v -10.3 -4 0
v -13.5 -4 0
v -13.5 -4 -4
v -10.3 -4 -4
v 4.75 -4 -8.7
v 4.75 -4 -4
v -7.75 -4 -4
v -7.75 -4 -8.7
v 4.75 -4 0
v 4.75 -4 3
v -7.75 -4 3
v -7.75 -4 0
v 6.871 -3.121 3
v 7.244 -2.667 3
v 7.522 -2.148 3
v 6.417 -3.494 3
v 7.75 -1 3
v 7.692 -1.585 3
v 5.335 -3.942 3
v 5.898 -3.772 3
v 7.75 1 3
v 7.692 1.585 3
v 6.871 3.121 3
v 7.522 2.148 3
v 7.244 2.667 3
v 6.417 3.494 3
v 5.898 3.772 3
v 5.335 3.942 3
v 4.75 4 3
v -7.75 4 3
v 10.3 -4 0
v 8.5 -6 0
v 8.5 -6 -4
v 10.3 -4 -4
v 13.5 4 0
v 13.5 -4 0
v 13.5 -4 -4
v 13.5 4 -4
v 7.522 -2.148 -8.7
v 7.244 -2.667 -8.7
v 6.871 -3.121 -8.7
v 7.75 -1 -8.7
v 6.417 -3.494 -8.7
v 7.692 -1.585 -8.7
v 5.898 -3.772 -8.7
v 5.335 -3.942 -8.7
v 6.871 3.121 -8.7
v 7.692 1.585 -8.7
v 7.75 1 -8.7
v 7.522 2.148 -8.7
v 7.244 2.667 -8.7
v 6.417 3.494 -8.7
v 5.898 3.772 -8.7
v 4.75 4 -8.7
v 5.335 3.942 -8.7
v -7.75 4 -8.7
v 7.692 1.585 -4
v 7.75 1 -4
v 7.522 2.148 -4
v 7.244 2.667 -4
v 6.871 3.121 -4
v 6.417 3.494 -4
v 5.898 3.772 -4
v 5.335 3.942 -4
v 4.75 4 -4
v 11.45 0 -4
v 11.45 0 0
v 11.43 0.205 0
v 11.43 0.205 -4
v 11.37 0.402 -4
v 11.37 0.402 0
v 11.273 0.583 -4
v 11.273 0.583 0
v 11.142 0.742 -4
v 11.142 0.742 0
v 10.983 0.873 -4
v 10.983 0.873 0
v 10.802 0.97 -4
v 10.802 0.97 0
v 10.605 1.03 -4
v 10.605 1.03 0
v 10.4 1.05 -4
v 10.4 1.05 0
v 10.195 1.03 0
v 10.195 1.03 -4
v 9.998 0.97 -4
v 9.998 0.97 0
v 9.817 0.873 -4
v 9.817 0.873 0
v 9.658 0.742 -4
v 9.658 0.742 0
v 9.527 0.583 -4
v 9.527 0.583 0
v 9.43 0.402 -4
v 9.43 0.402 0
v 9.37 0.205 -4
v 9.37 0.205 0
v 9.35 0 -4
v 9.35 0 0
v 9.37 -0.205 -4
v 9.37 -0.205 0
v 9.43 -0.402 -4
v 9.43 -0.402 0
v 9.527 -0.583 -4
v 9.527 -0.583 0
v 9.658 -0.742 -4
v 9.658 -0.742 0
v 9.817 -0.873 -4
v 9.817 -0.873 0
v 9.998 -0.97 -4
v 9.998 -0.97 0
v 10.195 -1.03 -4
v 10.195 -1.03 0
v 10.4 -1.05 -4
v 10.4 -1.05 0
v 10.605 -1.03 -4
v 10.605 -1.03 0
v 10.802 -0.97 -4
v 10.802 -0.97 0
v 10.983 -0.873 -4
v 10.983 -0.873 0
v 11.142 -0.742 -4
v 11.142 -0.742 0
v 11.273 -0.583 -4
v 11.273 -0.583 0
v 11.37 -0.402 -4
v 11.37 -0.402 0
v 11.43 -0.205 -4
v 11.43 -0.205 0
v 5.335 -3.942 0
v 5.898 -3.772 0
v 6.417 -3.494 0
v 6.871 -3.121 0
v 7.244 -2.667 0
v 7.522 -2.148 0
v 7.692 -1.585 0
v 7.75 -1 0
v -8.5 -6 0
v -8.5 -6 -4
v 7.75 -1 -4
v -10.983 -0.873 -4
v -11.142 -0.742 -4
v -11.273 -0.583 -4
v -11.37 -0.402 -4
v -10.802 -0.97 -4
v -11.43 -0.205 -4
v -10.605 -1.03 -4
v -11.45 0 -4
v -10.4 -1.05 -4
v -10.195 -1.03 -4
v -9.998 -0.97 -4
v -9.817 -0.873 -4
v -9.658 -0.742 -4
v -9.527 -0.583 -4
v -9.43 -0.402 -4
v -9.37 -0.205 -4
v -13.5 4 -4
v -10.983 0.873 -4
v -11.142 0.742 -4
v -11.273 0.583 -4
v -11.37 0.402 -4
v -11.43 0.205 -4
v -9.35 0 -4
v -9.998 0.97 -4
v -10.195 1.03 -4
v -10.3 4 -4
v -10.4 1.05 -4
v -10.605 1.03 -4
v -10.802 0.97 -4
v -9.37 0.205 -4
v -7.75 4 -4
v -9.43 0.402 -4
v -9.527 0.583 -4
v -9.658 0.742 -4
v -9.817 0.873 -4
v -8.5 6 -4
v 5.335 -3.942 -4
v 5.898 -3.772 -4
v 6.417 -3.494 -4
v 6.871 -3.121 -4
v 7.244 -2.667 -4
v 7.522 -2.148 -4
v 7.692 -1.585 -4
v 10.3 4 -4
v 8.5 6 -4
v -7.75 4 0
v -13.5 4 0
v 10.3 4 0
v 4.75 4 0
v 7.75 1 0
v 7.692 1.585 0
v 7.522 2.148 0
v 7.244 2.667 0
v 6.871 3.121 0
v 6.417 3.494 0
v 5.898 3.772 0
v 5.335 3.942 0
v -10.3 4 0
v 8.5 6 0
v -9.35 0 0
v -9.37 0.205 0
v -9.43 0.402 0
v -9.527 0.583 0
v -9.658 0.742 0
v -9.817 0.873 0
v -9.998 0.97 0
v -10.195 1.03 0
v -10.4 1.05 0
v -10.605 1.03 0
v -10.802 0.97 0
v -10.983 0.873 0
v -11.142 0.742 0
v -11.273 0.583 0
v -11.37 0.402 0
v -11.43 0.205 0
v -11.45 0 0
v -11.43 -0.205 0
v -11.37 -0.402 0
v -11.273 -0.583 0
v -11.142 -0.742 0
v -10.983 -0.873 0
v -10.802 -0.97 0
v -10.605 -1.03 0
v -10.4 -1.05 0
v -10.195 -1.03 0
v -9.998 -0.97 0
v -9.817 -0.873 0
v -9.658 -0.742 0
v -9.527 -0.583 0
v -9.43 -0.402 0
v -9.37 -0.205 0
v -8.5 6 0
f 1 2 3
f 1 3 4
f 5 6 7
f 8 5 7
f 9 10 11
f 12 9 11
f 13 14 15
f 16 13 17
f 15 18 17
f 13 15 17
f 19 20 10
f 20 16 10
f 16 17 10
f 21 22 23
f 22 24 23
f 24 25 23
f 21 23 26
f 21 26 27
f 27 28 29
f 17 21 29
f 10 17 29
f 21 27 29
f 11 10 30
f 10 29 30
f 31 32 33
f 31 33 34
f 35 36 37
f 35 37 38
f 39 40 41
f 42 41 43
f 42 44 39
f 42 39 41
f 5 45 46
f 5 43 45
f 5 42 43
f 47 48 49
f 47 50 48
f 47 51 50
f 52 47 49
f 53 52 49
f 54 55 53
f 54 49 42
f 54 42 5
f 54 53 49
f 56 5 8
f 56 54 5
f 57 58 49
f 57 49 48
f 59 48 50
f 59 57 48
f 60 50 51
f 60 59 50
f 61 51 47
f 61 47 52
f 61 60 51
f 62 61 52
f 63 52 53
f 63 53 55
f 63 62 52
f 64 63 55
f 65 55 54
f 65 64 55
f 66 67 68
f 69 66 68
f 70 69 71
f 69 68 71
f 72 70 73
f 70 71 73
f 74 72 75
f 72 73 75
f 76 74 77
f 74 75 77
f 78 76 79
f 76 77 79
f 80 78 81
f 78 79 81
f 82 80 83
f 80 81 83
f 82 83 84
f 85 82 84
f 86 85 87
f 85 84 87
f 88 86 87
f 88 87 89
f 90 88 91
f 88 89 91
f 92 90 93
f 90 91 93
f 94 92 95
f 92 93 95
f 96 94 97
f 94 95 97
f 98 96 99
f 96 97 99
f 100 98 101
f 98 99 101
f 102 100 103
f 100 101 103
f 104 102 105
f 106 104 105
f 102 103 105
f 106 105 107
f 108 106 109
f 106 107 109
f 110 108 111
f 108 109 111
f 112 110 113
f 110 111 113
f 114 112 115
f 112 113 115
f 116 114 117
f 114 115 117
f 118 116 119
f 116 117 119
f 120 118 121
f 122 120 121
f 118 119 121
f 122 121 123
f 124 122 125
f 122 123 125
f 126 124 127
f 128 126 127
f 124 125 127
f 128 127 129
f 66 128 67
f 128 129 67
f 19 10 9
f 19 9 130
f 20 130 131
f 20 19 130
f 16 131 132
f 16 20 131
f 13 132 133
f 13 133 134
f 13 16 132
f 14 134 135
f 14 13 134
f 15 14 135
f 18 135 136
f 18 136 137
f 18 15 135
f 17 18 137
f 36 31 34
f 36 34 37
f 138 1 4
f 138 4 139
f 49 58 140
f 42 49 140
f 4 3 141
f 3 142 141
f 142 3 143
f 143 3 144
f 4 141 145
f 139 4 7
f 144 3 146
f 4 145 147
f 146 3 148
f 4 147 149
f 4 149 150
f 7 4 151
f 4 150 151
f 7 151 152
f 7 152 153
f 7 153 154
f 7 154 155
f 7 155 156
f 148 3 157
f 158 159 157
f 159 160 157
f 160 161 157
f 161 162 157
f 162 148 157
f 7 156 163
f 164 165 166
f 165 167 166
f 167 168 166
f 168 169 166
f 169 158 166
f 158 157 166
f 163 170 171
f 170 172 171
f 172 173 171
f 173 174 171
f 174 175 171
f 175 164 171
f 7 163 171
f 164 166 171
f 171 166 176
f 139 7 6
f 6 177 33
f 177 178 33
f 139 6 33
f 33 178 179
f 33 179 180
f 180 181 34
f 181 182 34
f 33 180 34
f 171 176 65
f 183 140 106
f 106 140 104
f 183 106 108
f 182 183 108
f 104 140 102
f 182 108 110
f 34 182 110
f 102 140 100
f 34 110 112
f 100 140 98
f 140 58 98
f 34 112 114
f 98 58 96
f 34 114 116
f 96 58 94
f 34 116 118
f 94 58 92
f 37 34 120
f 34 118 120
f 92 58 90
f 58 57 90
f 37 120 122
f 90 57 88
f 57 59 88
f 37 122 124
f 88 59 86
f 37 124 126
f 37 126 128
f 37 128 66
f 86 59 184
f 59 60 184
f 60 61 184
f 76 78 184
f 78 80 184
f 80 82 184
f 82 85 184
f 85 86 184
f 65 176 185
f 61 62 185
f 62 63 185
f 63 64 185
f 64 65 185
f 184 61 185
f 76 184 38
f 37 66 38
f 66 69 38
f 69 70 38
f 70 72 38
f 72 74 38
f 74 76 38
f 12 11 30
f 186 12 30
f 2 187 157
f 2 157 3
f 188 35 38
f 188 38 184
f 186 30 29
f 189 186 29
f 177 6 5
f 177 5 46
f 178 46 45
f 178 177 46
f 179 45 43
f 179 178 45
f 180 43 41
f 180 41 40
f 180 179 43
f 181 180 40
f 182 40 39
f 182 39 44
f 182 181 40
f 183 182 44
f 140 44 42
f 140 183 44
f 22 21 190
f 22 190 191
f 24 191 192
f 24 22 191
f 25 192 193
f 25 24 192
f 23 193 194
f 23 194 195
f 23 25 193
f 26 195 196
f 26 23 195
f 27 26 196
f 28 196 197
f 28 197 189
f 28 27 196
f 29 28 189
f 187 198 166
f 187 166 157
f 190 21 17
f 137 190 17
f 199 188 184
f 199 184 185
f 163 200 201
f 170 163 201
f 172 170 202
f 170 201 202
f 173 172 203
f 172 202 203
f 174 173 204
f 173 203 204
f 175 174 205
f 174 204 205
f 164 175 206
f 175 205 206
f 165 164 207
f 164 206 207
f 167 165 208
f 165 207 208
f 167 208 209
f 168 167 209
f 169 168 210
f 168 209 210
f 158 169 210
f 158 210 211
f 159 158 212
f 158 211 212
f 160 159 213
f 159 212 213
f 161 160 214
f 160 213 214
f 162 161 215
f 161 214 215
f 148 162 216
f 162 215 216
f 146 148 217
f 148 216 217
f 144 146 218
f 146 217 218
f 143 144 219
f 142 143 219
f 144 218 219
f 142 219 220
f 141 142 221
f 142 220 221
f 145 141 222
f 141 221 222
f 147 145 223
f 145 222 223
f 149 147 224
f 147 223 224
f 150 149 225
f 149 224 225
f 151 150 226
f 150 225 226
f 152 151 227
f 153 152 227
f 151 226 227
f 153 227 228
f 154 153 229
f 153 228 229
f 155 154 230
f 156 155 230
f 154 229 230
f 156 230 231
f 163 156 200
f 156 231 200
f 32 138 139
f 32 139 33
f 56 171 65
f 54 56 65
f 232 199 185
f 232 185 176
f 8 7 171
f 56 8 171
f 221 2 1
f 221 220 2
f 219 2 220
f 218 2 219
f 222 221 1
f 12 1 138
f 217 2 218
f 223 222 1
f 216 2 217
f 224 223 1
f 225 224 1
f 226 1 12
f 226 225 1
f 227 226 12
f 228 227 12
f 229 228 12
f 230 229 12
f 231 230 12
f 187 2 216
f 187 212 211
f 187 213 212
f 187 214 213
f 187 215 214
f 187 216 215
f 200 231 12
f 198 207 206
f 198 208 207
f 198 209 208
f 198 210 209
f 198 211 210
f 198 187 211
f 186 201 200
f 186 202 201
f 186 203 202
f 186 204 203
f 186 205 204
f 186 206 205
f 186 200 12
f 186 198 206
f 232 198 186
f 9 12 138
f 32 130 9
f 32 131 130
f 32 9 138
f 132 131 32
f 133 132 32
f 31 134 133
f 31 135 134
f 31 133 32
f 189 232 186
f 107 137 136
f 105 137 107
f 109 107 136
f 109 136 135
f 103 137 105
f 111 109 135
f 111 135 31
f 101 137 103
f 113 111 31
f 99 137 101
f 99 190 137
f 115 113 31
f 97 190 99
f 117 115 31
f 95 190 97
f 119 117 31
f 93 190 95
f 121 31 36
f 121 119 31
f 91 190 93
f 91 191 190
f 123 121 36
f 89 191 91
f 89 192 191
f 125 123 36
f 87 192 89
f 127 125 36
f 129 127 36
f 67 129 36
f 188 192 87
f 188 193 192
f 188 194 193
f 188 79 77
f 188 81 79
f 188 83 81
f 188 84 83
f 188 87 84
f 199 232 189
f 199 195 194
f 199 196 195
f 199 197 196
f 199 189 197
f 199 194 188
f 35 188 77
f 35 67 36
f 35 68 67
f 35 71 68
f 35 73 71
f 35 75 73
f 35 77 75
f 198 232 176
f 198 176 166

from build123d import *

# Parameters (mm, degrees)
PAD_DEPTH      = 3
PAD_DEPTH_BACK = 8.7
SKETCH001_R    = 1.05
PAD001_DEPTH   = 4


with BuildPart() as part:
    # Sketch → Pad (new body, two sides)
    with BuildSketch(Plane.XY) as pad_sk:
        with BuildLine():
            Line((-7.75, -4), (-7.75, 4))
            Line((-7.75, 4), (4.75, 4))
            ThreePointArc((7.75, 1), (6.87132, 3.12132), (4.75, 4))
            Line((7.75, 1), (7.75, -1))
            ThreePointArc((4.75, -4), (6.87132, -3.12132), (7.75, -1))
            Line((4.75, -4), (-7.75, -4))
        make_face()
    extrude(amount=PAD_DEPTH)
    extrude(pad_sk.sketch, amount=-PAD_DEPTH_BACK)

    # Sketch001 → Pad001 (join)
    with BuildSketch(Plane.XY):
        Polygon((-13.5, 4), (-13.5, -4), (-10.3, -4), (-8.5, -6), (8.5, -6), (10.3, -4), (13.5, -4), (13.5, 4), (10.3, 4), (8.5, 6), (-8.5, 6), (-10.3, 4), align=None)
        with Locations((-10.4, 0)):
            Circle(SKETCH001_R, mode=Mode.SUBTRACT)
        with Locations((10.4, 0)):
            Circle(SKETCH001_R, mode=Mode.SUBTRACT)
    extrude(amount=-PAD001_DEPTH)


solid = part.part
